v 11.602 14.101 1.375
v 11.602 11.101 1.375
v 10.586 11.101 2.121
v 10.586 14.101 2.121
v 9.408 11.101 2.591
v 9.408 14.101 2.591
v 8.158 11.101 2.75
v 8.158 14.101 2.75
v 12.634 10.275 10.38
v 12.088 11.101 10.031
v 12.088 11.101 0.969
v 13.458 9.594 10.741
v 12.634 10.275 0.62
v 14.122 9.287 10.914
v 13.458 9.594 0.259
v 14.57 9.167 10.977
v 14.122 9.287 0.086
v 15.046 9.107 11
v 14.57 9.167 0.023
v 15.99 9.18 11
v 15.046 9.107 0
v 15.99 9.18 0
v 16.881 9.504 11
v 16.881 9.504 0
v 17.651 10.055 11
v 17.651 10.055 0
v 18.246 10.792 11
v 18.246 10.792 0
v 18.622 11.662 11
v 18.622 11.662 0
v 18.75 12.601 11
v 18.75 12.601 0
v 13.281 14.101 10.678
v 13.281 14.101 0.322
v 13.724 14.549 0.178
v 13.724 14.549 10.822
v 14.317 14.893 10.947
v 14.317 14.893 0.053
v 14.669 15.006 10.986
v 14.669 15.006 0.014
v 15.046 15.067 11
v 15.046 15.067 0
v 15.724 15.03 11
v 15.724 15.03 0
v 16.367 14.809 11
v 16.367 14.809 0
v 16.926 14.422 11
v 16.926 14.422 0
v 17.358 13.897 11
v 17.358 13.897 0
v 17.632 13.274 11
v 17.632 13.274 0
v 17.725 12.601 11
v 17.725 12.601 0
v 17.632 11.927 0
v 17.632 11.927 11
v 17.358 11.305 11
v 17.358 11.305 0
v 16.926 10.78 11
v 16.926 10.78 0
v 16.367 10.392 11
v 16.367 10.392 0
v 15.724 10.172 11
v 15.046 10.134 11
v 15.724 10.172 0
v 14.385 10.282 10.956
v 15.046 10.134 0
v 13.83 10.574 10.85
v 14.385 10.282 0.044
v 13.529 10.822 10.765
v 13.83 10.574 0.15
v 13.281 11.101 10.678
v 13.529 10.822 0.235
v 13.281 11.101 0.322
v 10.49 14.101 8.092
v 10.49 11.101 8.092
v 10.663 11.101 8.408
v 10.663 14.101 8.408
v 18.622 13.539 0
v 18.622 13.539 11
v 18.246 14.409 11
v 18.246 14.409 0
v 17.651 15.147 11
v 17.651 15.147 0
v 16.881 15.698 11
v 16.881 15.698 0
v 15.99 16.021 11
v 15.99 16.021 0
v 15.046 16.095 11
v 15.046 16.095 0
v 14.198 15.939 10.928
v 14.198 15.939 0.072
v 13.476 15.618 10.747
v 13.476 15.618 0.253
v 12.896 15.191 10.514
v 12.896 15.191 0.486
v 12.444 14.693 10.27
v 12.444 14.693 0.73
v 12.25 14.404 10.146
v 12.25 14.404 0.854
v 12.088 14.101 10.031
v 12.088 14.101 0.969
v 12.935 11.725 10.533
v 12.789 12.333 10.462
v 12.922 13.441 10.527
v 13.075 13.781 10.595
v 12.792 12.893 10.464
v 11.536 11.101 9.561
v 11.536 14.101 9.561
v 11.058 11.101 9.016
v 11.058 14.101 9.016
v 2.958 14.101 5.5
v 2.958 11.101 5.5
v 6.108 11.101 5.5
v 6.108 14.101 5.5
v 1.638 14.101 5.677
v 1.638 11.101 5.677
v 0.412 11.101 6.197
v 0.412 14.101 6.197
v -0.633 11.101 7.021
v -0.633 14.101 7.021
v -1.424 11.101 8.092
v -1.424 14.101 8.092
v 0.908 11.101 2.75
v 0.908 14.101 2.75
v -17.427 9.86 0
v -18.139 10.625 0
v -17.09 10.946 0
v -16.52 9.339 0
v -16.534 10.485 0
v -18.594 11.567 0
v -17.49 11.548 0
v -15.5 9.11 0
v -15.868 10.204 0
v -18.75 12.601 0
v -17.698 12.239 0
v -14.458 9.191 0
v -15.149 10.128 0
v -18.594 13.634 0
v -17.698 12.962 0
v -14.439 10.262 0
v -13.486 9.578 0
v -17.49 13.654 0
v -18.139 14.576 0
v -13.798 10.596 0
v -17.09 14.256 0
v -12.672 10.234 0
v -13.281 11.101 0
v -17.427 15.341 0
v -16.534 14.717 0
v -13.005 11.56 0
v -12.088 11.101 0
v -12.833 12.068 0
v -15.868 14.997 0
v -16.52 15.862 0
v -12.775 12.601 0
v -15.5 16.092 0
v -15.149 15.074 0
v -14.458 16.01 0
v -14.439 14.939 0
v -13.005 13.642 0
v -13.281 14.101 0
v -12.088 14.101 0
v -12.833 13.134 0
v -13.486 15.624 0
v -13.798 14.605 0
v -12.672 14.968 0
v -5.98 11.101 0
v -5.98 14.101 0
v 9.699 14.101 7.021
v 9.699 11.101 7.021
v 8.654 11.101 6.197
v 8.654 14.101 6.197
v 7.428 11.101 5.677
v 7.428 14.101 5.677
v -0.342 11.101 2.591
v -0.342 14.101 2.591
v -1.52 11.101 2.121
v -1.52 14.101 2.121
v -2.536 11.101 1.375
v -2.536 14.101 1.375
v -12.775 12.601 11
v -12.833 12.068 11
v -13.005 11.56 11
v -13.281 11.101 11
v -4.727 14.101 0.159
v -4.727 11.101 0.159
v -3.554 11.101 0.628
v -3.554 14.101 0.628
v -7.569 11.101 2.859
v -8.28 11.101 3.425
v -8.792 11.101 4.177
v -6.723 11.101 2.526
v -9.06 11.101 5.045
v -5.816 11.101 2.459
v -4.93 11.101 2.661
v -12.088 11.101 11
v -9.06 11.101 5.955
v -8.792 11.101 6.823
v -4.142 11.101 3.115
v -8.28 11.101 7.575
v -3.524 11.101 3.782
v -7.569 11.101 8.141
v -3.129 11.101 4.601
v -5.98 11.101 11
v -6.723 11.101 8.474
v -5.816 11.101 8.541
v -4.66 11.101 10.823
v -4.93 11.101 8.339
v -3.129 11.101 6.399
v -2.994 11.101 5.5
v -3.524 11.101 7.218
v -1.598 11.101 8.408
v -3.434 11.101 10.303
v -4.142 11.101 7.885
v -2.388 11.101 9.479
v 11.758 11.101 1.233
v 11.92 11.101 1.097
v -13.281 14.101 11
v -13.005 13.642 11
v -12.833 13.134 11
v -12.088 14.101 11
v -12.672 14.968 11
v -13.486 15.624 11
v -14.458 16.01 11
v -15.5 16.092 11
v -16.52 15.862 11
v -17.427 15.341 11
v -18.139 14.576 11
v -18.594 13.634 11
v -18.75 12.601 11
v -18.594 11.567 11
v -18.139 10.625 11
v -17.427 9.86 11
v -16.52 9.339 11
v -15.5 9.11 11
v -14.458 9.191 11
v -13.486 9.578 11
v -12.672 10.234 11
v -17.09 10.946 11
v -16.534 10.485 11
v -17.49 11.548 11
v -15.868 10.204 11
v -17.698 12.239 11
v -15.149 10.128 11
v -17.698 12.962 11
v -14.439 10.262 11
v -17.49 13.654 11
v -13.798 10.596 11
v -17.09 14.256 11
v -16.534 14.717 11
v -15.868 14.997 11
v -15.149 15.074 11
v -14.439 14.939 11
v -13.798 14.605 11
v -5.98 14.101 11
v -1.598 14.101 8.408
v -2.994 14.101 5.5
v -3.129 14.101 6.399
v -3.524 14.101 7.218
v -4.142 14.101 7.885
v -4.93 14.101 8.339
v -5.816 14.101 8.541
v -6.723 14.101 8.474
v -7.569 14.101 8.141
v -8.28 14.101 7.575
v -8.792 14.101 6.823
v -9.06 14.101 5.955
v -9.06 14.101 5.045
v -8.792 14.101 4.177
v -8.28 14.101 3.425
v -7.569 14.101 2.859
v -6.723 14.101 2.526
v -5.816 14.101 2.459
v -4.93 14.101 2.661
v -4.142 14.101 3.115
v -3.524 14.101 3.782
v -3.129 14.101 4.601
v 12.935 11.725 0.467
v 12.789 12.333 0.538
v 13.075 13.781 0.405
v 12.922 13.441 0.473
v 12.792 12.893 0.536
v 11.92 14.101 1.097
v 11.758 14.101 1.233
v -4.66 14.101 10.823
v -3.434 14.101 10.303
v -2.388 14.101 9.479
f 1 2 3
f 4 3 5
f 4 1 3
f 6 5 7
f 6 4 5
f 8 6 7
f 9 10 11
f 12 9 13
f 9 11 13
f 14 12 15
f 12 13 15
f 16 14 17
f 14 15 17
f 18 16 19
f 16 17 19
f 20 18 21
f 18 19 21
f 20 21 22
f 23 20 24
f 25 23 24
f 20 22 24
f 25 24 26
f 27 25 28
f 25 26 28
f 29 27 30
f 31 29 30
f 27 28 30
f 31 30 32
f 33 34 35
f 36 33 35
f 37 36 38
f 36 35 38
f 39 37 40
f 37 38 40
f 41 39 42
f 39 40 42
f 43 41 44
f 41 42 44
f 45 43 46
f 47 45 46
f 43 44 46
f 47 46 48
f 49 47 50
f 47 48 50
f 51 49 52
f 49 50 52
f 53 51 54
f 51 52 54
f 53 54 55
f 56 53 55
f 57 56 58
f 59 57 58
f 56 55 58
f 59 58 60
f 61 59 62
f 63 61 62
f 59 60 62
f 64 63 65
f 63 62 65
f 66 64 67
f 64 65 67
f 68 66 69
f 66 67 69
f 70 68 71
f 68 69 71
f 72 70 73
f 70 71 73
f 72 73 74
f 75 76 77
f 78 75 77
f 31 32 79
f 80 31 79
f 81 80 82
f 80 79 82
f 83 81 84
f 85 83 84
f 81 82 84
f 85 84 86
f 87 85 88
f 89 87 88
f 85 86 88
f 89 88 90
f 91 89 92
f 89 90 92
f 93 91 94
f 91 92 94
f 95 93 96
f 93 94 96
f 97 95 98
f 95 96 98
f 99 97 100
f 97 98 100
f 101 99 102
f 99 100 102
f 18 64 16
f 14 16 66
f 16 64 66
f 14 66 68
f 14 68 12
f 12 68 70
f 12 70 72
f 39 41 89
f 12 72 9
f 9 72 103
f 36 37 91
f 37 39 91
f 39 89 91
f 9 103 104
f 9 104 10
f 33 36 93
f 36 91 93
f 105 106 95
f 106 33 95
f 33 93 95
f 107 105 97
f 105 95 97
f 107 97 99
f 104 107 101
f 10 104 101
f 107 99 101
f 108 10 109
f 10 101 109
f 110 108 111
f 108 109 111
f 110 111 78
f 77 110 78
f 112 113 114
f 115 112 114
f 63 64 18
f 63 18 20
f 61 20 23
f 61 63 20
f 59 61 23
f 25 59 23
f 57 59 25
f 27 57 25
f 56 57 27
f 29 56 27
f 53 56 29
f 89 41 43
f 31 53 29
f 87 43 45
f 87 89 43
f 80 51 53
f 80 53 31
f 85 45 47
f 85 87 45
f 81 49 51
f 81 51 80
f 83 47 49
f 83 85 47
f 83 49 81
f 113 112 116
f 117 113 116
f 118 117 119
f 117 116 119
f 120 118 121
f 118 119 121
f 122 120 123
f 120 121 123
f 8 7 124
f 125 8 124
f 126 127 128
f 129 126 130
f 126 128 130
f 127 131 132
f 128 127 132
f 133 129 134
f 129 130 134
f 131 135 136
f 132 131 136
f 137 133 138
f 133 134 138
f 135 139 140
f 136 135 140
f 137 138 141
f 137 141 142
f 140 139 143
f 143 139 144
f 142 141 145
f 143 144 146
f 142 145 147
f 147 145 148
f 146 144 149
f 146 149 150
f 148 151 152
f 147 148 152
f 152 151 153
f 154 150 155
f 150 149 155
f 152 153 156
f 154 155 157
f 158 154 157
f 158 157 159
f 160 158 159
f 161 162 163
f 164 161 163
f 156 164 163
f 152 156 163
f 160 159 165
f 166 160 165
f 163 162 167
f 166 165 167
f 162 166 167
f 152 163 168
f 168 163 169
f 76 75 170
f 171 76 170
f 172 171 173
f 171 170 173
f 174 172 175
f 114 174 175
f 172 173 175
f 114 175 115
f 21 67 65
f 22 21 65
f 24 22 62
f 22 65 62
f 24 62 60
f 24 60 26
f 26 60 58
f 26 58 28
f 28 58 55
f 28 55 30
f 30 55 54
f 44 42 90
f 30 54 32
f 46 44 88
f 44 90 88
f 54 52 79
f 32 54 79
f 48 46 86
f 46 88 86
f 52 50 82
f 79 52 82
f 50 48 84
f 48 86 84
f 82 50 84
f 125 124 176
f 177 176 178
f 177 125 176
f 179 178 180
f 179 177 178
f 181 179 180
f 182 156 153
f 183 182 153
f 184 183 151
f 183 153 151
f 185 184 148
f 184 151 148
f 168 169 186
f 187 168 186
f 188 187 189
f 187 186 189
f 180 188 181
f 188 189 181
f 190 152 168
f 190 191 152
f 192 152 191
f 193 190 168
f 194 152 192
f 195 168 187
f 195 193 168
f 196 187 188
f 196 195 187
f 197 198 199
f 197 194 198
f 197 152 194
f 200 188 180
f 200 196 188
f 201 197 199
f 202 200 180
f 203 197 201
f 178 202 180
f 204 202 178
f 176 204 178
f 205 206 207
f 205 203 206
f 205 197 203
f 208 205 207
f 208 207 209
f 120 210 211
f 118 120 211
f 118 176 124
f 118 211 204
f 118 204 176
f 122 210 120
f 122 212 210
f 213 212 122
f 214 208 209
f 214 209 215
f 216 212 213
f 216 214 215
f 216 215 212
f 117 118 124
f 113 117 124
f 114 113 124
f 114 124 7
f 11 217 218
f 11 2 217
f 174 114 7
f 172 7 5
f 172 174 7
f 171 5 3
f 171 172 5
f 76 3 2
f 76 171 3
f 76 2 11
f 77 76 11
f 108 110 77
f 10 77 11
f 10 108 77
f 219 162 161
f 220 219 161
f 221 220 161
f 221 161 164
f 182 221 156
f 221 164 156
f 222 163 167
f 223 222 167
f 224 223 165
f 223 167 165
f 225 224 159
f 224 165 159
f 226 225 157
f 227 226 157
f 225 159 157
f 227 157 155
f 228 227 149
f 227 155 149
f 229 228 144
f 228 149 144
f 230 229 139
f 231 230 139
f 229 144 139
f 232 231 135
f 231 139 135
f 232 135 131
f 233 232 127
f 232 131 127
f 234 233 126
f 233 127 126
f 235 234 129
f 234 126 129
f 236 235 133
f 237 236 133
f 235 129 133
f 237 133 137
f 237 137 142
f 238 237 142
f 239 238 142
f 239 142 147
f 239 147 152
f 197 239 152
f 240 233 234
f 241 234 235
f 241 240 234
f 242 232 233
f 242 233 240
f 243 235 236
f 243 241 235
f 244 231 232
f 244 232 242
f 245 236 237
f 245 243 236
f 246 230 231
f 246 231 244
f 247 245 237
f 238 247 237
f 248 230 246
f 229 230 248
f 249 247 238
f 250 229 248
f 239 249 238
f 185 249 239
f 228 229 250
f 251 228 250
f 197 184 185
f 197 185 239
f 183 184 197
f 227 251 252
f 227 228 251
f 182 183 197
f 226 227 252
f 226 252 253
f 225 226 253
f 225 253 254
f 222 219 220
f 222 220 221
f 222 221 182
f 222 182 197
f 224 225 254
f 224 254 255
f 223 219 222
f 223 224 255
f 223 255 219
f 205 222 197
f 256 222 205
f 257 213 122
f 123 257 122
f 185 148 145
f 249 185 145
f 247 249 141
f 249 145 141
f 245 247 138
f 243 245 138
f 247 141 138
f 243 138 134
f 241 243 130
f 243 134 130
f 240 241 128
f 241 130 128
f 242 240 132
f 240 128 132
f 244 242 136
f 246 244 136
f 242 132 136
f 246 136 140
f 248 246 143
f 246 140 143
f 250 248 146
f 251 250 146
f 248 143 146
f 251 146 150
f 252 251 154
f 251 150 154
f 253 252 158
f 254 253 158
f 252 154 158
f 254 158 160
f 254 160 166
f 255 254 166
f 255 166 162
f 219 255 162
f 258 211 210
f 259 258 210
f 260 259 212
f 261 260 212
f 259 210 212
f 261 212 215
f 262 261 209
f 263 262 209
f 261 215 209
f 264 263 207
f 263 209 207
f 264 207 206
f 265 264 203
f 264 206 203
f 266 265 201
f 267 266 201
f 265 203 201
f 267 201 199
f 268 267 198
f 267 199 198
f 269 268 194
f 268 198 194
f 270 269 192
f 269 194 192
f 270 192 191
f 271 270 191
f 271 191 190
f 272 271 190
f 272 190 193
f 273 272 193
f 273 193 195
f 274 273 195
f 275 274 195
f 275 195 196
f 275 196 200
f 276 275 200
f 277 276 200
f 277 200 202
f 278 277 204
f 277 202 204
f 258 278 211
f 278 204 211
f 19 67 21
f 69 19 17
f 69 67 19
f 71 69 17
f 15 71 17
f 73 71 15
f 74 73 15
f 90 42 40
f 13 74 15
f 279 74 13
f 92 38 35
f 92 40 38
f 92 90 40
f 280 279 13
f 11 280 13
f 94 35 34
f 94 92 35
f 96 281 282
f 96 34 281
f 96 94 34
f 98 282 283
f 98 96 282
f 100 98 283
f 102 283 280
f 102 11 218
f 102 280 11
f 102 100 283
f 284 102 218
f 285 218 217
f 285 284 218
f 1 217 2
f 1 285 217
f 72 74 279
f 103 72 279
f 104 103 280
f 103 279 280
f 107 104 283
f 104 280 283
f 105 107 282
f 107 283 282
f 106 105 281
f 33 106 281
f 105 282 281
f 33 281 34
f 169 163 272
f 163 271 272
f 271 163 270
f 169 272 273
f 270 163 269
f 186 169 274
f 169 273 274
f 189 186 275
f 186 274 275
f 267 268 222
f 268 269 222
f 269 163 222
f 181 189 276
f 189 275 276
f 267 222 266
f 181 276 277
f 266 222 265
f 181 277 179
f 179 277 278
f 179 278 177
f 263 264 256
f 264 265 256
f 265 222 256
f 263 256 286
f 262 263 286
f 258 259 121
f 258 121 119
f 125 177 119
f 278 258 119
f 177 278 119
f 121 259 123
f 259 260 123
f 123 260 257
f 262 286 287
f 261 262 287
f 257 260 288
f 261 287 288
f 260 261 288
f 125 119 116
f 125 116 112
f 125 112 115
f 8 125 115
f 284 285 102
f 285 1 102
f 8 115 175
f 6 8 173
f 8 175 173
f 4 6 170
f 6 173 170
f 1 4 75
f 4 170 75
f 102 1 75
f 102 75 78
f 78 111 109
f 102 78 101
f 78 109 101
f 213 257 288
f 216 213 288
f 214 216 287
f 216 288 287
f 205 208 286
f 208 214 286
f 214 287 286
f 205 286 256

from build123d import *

# Parameters (mm, degrees)
F1_DEPTH    = 11
F2_R        = 3.05
F3_DEPTH    = 3
F4_T1_DEPTH = 3
F4_T3_DEPTH = 17.7890113567
F5_R        = 5


# Not quite as in the source:
# - a fillet or chamfer that OpenCascade refuses, or shapes differently, is made with other operations: its cross-section is extruded or revolved along the edge and cut away or added


with BuildPart() as f1:
    # F0 (on Top) → F1 (new body)
    with BuildSketch(Plane.XY):
        with BuildLine():
            ThreePointArc((13.2813392877, 14.1006531194), (16.0415774558, 14.9456542135), (17.725, 12.6006531194))
            ThreePointArc((17.725, 12.6006531194), (16.0415774558, 10.2556520253), (13.2813392877, 11.1006531194))
            Line((13.2813392877, 11.1006531194), (12.0877223398, 11.1006531194))
            ThreePointArc((12.0877223398, 11.1006531194), (16.0187744108, 9.1861273975), (18.75, 12.6006531194))
            ThreePointArc((18.75, 12.6006531194), (16.0187744108, 16.0151788413), (12.0877223398, 14.1006531194))
            Line((12.0877223398, 14.1006531194), (13.2813392877, 14.1006531194))
        make_face()
        with BuildLine():
            ThreePointArc((13.2813392877, 11.1006531194), (12.775, 12.6006531194), (13.2813392877, 14.1006531194))
            Line((13.2813392877, 14.1006531194), (12.0877223398, 14.1006531194))
            ThreePointArc((12.0877223398, 14.1006531194), (11.75, 12.6006531194), (12.0877223398, 11.1006531194))
            Line((12.0877223398, 11.1006531194), (13.2813392877, 11.1006531194))
        make_face()
        with BuildLine():
            ThreePointArc((12.0877223398, 11.1006531194), (11.75, 12.6006531194), (12.0877223398, 14.1006531194))
            Line((12.0877223398, 14.1006531194), (-12.0877223398, 14.1006531194))
            ThreePointArc((-12.0877223398, 14.1006531194), (-11.8354742781, 13.3694275302), (-11.75, 12.6006531194))
            ThreePointArc((-11.75, 12.6006531194), (-11.8354742781, 11.8318787086), (-12.0877223398, 11.1006531194))
            Line((-12.0877223398, 11.1006531194), (12.0877223398, 11.1006531194))
        make_face()
        with BuildLine():
            ThreePointArc((-11.75, 12.6006531194), (-11.8354742781, 13.3694275302), (-12.0877223398, 14.1006531194))
            Line((-12.0877223398, 14.1006531194), (-13.2813392877, 14.1006531194))
            ThreePointArc((-13.2813392877, 14.1006531194), (-12.9049989059, 13.3922305752), (-12.775, 12.6006531194))
            ThreePointArc((-12.775, 12.6006531194), (-12.9049989059, 11.8090756636), (-13.2813392877, 11.1006531194))
            Line((-13.2813392877, 11.1006531194), (-12.0877223398, 11.1006531194))
            ThreePointArc((-12.0877223398, 11.1006531194), (-11.8354742781, 11.8318787086), (-11.75, 12.6006531194))
        make_face()
        with BuildLine():
            Line((-13.2813392877, 14.1006531194), (-12.0877223398, 14.1006531194))
            ThreePointArc((-12.0877223398, 14.1006531194), (-18.75, 12.6006531194), (-12.0877223398, 11.1006531194))
            Line((-12.0877223398, 11.1006531194), (-13.2813392877, 11.1006531194))
            ThreePointArc((-13.2813392877, 11.1006531194), (-17.725, 12.6006531194), (-13.2813392877, 14.1006531194))
        make_face()
    extrude(amount=F1_DEPTH)

    # F2 (on face) → F3 (cut, through all)
    with BuildSketch(Plane.XZ.offset(-11.1006531194)):
        with Locations((-6.0438611699, 5.5)):
            Circle(F2_R)
        Polygon((12.0877223398, 11), (-3.021930585, 11), (0, 5.5), (9.0657917549, 5.5), align=None)
        Polygon((10.5767570474, 2.75), (-1.5109652925, 2.75), (-3.021930585, 0), (12.0877223398, 0), align=None)
    extrude(amount=-F3_DEPTH, mode=Mode.SUBTRACT)

    # F4: fillet of radius 5 on 6 edges, made by hand

    # F4_s2 → F4_t1 (join)
    with BuildSketch(Plane.XZ.offset(-14.1006531194)):
        with BuildLine():
            ThreePointArc((2.9578022713, 5.5), (0.4120783796, 6.1965955492), (-1.4243095392, 8.0922840533))
            Line((-1.4243095392, 8.0922840533), (0, 5.5))
            Line((0, 5.5), (2.9578022713, 5.5))
        make_face()
        with BuildLine():
            ThreePointArc((10.4901012941, 8.0922840533), (8.6537133753, 6.1965955492), (6.1079894835, 5.5))
            Line((6.1079894835, 5.5), (9.0657917549, 5.5))
            Line((9.0657917549, 5.5), (10.4901012941, 8.0922840533))
        make_face()
    extrude(amount=F4_T1_DEPTH)

    # F4_s4 → F4_t3 (cut)
    with BuildSketch(Plane.XZ.offset(-21.4951587977)):
        with BuildLine():
            ThreePointArc((-1.5976210458, 8.4077159467), (-3.4340089645, 10.3034044508), (-5.9797328563, 11))
            Line((-5.9797328563, 11), (-3.021930585, 11))
            Line((-3.021930585, 11), (-1.5976210458, 8.4077159467))
        make_face()
        with BuildLine():
            ThreePointArc((-5.9797328563, 0), (-3.4340089645, 0.6965955492), (-1.5976210458, 2.5922840533))
            Line((-1.5976210458, 2.5922840533), (-3.021930585, 0))
            Line((-3.021930585, 0), (-5.9797328563, 0))
        make_face()
        with BuildLine():
            ThreePointArc((15.0455246112, 0), (12.4998007194, 0.6965955492), (10.6634128006, 2.5922840533))
            Line((10.6634128006, 2.5922840533), (12.0877223398, 0))
            Line((12.0877223398, 0), (15.0455246112, 0))
        make_face()
        with BuildLine():
            ThreePointArc((15.0455246112, 11), (12.4998007194, 10.3034044508), (10.6634128006, 8.4077159467))
            Line((10.6634128006, 8.4077159467), (12.0877223398, 11))
            Line((12.0877223398, 11), (15.0455246112, 11))
        make_face()
    extrude(amount=F4_T3_DEPTH, mode=Mode.SUBTRACT)

    # F5
    f5_edges = [f1.edges().sort_by_distance(p)[0] for p in [
        (10.576757, 12.600653, 2.75),
        (-1.510965, 12.600653, 2.75),
    ]]
    fillet(f5_edges, radius=F5_R)


solid = f1.part
